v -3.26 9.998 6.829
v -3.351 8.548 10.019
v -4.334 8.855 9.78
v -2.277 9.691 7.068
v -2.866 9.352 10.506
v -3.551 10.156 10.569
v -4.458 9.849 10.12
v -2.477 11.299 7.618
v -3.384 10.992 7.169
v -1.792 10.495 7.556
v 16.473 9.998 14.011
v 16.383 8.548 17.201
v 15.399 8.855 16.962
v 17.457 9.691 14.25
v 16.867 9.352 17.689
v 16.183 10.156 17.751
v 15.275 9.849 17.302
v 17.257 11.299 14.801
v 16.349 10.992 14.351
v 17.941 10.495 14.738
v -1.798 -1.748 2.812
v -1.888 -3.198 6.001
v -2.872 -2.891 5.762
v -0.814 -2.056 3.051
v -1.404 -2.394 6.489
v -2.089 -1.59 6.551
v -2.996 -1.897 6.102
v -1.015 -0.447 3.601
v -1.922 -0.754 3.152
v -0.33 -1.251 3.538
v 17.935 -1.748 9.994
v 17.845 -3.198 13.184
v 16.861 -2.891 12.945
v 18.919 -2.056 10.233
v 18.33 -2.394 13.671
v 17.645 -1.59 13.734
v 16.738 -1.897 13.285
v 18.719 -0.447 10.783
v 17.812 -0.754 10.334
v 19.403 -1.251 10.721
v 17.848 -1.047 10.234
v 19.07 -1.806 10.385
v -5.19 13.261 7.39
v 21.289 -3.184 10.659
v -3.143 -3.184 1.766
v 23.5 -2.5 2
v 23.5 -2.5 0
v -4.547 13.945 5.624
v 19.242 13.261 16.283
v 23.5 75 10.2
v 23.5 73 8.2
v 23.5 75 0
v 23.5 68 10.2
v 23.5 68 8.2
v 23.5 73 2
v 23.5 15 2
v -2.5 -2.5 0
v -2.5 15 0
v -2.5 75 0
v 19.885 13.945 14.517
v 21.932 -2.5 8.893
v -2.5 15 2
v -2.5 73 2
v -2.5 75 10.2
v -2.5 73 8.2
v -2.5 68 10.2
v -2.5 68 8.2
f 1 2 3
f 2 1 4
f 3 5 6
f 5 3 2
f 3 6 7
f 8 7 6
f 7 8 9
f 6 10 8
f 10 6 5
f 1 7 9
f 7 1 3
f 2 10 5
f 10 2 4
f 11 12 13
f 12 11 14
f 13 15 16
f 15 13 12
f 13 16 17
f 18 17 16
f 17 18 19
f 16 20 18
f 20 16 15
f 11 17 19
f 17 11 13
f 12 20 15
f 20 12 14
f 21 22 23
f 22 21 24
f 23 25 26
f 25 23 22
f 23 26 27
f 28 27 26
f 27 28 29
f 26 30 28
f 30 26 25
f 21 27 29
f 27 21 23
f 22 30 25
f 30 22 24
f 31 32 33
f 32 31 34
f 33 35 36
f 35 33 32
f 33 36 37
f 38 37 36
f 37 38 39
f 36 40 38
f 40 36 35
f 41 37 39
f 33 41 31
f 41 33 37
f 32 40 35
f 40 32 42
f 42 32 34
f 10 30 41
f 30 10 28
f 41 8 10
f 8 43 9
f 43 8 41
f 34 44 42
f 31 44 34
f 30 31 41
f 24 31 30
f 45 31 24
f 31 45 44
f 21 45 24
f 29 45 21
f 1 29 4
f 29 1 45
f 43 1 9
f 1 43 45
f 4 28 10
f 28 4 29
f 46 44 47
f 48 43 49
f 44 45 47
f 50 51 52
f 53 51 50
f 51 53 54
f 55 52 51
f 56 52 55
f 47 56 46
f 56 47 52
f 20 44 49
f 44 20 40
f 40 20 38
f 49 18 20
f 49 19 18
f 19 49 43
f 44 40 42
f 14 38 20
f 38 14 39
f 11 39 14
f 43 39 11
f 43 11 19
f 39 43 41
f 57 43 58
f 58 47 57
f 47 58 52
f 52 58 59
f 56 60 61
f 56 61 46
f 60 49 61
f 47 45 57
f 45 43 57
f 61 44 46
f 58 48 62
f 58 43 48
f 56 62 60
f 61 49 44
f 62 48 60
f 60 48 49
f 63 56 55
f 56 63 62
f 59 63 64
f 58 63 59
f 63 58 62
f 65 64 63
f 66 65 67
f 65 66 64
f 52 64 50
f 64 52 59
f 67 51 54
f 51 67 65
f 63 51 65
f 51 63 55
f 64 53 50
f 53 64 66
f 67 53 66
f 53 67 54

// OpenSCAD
wall_thickness = 6.2;
thickness = 2;
height_offset = 60;

right_rotation = 20;
down_rotation  = 20;

rotate([down_rotation,-right_rotation,0])
translate([0,0,thickness]){

    cylinder(h=5, d=1.8);
    translate([21,0,0]) cylinder(h=5, d=1.8);

    translate([0,12.5,0]) {
        cylinder(h=5, d=1.8);
        translate([21,0,0]) cylinder(h=5, d=1.8);    
        }
}

    
    
translate([-5/2,-5/2,0]){
    hull() {
    rotate([down_rotation,-right_rotation,0]) cube([21+5, 12.5+5, 2]);
    cube([21+5, 12.5+5, 2]);
    }
    translate([0, 12.5+5, 0]) cube([21+5, height_offset, 2]);
    translate([0,12.5+5+height_offset-thickness,thickness]) #cube([21+5,thickness,wall_thickness]);
    translate([0,12.5+height_offset-thickness,wall_thickness+thickness]) cube([21+5,5+thickness,thickness]);
    }
